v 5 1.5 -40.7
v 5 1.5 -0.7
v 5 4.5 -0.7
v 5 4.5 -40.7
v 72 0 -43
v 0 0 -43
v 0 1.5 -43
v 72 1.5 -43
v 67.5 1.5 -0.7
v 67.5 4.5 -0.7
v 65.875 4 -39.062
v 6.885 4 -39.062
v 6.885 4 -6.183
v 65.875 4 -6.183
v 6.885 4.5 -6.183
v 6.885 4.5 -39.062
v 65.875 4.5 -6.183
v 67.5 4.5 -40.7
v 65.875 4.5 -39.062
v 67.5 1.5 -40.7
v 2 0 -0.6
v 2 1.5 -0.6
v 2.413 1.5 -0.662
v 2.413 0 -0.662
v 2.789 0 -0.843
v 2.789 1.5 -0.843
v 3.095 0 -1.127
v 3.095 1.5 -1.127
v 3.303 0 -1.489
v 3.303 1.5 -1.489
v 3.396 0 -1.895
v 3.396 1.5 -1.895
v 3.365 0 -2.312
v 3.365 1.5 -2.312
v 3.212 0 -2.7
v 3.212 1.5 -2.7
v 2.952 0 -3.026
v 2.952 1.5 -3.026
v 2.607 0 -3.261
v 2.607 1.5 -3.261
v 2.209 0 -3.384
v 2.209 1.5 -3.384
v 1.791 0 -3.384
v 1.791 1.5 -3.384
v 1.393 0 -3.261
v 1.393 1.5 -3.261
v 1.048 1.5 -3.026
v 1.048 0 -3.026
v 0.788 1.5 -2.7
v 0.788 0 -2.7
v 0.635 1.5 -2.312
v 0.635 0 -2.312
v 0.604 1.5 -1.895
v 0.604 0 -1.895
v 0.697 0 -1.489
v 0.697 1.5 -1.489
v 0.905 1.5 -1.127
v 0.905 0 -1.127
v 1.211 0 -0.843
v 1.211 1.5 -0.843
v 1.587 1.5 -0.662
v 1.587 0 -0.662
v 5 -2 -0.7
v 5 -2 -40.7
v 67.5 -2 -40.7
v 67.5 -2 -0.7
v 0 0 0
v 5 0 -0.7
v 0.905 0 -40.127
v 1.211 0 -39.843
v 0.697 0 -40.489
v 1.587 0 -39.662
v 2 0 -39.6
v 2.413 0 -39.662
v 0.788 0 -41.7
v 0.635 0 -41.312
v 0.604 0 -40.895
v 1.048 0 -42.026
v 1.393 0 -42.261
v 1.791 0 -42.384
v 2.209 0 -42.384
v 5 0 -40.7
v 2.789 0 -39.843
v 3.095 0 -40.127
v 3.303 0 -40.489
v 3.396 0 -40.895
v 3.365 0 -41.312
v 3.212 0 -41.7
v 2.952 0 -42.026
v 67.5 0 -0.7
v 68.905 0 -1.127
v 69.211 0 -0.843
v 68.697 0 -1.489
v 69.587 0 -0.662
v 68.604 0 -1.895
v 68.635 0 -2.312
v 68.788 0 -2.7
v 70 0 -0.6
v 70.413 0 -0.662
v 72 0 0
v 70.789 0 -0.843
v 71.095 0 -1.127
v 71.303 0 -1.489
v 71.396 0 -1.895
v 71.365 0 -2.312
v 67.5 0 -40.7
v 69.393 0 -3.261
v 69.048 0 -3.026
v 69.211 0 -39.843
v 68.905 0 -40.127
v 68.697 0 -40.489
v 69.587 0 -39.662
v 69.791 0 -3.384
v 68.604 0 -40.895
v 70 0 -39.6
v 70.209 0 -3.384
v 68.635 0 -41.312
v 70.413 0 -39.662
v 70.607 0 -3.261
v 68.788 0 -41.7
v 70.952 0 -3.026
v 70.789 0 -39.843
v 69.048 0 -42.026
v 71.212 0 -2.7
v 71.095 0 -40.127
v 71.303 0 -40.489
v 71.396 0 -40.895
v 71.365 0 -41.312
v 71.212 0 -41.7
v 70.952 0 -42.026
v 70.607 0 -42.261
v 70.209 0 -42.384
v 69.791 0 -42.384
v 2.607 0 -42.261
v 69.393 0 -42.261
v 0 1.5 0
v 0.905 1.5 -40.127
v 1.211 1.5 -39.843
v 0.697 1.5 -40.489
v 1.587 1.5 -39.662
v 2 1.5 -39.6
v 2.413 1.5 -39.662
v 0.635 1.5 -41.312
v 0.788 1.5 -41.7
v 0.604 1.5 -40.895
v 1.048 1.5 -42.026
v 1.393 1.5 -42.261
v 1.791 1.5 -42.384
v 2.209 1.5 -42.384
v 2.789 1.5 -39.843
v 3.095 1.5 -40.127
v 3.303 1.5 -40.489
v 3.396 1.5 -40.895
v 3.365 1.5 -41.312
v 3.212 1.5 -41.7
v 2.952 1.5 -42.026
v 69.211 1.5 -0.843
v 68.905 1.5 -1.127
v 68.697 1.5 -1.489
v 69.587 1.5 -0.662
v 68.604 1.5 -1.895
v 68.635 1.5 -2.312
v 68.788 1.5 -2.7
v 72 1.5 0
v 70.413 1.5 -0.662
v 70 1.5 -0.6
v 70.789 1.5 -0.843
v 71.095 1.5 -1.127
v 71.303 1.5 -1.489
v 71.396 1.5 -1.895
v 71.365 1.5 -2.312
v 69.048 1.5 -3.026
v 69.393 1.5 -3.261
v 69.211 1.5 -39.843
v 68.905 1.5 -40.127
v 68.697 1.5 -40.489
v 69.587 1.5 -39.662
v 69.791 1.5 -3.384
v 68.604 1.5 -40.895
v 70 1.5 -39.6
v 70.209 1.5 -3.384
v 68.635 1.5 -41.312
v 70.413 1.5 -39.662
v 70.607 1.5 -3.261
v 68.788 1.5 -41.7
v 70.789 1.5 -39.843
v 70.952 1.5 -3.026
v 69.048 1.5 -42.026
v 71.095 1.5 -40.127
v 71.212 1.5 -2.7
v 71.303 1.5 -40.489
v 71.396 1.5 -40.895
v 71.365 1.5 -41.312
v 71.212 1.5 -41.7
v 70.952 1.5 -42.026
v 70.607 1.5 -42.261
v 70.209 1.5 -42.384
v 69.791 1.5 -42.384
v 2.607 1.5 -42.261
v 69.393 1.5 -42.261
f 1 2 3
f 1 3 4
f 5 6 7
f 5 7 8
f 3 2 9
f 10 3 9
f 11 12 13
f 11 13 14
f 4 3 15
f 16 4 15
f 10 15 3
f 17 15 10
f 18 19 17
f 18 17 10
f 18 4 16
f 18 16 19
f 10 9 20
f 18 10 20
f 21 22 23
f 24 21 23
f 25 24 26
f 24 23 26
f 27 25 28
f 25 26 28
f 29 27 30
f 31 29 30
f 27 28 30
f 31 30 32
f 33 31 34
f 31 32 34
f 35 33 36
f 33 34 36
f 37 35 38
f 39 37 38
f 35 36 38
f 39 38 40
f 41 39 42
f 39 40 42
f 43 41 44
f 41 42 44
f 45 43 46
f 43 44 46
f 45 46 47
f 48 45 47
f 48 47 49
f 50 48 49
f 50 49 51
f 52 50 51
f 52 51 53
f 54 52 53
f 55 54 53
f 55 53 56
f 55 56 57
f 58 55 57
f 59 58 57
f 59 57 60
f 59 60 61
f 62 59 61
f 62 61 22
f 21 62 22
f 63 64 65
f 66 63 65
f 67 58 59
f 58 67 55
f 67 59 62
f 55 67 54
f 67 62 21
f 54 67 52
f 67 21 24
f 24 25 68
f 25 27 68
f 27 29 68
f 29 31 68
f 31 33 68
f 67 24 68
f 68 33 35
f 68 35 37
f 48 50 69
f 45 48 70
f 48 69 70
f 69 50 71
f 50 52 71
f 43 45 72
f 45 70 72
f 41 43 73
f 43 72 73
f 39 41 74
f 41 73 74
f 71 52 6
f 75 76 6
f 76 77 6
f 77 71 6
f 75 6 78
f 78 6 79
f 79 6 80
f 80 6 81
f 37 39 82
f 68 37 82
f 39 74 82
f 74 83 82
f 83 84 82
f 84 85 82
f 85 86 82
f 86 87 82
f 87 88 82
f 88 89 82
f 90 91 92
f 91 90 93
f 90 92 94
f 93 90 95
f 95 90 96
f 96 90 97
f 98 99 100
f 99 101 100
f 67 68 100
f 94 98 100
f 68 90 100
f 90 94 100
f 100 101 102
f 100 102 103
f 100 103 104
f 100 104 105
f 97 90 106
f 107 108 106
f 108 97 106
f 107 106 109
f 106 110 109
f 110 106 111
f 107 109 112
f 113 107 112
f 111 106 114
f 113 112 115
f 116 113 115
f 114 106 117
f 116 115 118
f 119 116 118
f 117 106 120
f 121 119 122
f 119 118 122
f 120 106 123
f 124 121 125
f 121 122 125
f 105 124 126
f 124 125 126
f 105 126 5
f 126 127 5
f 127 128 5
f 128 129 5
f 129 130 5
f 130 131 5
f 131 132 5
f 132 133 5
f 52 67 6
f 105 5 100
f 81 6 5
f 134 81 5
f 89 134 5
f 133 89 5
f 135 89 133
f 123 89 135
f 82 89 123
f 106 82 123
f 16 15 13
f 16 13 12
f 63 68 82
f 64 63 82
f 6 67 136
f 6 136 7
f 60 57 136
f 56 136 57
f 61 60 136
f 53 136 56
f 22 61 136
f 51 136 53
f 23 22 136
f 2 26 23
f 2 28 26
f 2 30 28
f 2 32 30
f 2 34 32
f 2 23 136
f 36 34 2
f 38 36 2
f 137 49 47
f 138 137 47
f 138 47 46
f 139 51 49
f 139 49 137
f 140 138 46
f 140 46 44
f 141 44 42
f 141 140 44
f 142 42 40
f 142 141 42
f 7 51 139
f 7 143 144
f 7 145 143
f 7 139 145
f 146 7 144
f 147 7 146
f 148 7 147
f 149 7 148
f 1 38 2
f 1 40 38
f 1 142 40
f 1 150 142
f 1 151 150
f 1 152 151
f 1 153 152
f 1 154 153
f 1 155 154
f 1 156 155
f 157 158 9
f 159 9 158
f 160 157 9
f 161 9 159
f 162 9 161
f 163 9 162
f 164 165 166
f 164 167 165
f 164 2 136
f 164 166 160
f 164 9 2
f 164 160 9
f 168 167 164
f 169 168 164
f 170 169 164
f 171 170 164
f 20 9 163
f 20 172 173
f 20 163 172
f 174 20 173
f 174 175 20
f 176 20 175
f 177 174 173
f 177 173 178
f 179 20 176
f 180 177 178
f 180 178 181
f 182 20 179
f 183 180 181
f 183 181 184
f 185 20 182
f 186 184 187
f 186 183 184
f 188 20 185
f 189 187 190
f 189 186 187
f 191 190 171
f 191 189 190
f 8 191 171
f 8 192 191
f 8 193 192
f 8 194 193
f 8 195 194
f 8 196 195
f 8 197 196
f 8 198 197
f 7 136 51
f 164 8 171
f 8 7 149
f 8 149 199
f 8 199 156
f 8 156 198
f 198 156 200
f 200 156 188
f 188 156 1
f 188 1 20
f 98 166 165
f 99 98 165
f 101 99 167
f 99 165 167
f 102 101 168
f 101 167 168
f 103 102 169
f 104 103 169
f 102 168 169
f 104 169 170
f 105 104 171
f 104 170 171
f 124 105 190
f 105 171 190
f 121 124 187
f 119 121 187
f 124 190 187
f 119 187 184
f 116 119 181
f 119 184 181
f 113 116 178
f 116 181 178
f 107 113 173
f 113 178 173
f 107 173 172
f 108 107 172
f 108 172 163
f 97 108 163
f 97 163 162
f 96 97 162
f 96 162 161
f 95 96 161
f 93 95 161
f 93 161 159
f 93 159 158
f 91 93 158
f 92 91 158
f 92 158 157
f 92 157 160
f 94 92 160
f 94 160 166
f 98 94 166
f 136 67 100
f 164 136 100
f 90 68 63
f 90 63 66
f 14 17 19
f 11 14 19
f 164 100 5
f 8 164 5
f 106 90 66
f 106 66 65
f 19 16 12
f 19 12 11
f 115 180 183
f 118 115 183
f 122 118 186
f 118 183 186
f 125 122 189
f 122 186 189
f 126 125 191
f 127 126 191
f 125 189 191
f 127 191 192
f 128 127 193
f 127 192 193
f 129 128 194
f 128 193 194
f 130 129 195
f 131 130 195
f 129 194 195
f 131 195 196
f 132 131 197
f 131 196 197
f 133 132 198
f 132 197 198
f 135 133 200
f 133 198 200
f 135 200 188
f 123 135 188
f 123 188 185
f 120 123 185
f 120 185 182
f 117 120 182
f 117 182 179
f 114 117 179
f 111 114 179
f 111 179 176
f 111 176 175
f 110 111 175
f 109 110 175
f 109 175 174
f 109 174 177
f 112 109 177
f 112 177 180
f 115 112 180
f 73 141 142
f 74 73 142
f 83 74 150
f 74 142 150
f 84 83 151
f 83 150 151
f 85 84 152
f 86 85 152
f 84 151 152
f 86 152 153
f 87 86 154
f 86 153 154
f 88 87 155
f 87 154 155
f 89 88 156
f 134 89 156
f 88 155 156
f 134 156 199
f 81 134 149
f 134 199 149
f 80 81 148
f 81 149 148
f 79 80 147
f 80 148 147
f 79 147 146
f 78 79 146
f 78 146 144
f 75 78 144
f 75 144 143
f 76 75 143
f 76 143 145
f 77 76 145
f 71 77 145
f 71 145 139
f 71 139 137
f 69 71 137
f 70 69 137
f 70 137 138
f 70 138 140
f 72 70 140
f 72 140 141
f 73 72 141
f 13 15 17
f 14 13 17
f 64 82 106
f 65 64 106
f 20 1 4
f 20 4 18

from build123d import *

# Parameters (mm, degrees)
SKETCH2_W           = 72
SKETCH2_H           = 43
BOSS_EXTRUDE1_DEPTH = 1.5
SKETCH3_R           = 1.4
CUT_EXTRUDE1_DEPTH  = 84.876397157
SKETCH4_W           = 62.5
SKETCH4_H           = 40
BOSS_EXTRUDE2_DEPTH = 3
SKETCH4_2_W         = 62.5
SKETCH4_2_H         = 40
BOSS_EXTRUDE3_DEPTH = 3.5
SKETCH8_W           = 58.989740066
SKETCH8_H           = 32.879527249
CUT_EXTRUDE2_DEPTH  = 0.5


with BuildPart() as part:
    # Sketch2 → Boss-Extrude1 (new body)
    with BuildSketch(Plane(origin=(0, 0, 0), x_dir=(1, 0, 0), z_dir=(0, 1, 0))):
        with Locations((36, 21.5)):
            Rectangle(SKETCH2_W, SKETCH2_H)
    extrude(amount=BOSS_EXTRUDE1_DEPTH)

    # Sketch3 → Cut-Extrude1 (cut, through all)
    with BuildSketch(Plane(origin=(0, 1.5, 0), x_dir=(1, 0, 0), z_dir=(0, 1, 0))):
        with Locations((2, 41)):
            Circle(SKETCH3_R)
        with Locations((70, 41)):
            Circle(SKETCH3_R)
        with Locations((2, 2)):
            Circle(SKETCH3_R)
        with Locations((70, 2)):
            Circle(SKETCH3_R)
    extrude(amount=-CUT_EXTRUDE1_DEPTH, mode=Mode.SUBTRACT)

    # Sketch4 → Boss-Extrude2 (add)
    with BuildSketch(Plane(origin=(0, 1.5, 0), x_dir=(1, 0, 0), z_dir=(0, 1, 0))):
        with Locations((36.25, 20.7)):
            Rectangle(SKETCH4_W, SKETCH4_H)
    extrude(amount=BOSS_EXTRUDE2_DEPTH)

    # Sketch4<2> → Boss-Extrude3 (add)
    with BuildSketch(Plane(origin=(0, 1.5, 0), x_dir=(1, 0, 0), z_dir=(0, 1, 0))):
        with Locations((36.25, 20.7)):
            Rectangle(SKETCH4_2_W, SKETCH4_2_H)
    extrude(amount=-BOSS_EXTRUDE3_DEPTH)

    # Sketch8 → Cut-Extrude2 (cut)
    with BuildSketch(Plane(origin=(0, 4.5, 0), x_dir=(1, 0, 0), z_dir=(0, 1, 0))):
        with Locations((36.379910504, 22.622462852)):
            Rectangle(SKETCH8_W, SKETCH8_H)
    extrude(amount=-CUT_EXTRUDE2_DEPTH, mode=Mode.SUBTRACT)


solid = part.part
